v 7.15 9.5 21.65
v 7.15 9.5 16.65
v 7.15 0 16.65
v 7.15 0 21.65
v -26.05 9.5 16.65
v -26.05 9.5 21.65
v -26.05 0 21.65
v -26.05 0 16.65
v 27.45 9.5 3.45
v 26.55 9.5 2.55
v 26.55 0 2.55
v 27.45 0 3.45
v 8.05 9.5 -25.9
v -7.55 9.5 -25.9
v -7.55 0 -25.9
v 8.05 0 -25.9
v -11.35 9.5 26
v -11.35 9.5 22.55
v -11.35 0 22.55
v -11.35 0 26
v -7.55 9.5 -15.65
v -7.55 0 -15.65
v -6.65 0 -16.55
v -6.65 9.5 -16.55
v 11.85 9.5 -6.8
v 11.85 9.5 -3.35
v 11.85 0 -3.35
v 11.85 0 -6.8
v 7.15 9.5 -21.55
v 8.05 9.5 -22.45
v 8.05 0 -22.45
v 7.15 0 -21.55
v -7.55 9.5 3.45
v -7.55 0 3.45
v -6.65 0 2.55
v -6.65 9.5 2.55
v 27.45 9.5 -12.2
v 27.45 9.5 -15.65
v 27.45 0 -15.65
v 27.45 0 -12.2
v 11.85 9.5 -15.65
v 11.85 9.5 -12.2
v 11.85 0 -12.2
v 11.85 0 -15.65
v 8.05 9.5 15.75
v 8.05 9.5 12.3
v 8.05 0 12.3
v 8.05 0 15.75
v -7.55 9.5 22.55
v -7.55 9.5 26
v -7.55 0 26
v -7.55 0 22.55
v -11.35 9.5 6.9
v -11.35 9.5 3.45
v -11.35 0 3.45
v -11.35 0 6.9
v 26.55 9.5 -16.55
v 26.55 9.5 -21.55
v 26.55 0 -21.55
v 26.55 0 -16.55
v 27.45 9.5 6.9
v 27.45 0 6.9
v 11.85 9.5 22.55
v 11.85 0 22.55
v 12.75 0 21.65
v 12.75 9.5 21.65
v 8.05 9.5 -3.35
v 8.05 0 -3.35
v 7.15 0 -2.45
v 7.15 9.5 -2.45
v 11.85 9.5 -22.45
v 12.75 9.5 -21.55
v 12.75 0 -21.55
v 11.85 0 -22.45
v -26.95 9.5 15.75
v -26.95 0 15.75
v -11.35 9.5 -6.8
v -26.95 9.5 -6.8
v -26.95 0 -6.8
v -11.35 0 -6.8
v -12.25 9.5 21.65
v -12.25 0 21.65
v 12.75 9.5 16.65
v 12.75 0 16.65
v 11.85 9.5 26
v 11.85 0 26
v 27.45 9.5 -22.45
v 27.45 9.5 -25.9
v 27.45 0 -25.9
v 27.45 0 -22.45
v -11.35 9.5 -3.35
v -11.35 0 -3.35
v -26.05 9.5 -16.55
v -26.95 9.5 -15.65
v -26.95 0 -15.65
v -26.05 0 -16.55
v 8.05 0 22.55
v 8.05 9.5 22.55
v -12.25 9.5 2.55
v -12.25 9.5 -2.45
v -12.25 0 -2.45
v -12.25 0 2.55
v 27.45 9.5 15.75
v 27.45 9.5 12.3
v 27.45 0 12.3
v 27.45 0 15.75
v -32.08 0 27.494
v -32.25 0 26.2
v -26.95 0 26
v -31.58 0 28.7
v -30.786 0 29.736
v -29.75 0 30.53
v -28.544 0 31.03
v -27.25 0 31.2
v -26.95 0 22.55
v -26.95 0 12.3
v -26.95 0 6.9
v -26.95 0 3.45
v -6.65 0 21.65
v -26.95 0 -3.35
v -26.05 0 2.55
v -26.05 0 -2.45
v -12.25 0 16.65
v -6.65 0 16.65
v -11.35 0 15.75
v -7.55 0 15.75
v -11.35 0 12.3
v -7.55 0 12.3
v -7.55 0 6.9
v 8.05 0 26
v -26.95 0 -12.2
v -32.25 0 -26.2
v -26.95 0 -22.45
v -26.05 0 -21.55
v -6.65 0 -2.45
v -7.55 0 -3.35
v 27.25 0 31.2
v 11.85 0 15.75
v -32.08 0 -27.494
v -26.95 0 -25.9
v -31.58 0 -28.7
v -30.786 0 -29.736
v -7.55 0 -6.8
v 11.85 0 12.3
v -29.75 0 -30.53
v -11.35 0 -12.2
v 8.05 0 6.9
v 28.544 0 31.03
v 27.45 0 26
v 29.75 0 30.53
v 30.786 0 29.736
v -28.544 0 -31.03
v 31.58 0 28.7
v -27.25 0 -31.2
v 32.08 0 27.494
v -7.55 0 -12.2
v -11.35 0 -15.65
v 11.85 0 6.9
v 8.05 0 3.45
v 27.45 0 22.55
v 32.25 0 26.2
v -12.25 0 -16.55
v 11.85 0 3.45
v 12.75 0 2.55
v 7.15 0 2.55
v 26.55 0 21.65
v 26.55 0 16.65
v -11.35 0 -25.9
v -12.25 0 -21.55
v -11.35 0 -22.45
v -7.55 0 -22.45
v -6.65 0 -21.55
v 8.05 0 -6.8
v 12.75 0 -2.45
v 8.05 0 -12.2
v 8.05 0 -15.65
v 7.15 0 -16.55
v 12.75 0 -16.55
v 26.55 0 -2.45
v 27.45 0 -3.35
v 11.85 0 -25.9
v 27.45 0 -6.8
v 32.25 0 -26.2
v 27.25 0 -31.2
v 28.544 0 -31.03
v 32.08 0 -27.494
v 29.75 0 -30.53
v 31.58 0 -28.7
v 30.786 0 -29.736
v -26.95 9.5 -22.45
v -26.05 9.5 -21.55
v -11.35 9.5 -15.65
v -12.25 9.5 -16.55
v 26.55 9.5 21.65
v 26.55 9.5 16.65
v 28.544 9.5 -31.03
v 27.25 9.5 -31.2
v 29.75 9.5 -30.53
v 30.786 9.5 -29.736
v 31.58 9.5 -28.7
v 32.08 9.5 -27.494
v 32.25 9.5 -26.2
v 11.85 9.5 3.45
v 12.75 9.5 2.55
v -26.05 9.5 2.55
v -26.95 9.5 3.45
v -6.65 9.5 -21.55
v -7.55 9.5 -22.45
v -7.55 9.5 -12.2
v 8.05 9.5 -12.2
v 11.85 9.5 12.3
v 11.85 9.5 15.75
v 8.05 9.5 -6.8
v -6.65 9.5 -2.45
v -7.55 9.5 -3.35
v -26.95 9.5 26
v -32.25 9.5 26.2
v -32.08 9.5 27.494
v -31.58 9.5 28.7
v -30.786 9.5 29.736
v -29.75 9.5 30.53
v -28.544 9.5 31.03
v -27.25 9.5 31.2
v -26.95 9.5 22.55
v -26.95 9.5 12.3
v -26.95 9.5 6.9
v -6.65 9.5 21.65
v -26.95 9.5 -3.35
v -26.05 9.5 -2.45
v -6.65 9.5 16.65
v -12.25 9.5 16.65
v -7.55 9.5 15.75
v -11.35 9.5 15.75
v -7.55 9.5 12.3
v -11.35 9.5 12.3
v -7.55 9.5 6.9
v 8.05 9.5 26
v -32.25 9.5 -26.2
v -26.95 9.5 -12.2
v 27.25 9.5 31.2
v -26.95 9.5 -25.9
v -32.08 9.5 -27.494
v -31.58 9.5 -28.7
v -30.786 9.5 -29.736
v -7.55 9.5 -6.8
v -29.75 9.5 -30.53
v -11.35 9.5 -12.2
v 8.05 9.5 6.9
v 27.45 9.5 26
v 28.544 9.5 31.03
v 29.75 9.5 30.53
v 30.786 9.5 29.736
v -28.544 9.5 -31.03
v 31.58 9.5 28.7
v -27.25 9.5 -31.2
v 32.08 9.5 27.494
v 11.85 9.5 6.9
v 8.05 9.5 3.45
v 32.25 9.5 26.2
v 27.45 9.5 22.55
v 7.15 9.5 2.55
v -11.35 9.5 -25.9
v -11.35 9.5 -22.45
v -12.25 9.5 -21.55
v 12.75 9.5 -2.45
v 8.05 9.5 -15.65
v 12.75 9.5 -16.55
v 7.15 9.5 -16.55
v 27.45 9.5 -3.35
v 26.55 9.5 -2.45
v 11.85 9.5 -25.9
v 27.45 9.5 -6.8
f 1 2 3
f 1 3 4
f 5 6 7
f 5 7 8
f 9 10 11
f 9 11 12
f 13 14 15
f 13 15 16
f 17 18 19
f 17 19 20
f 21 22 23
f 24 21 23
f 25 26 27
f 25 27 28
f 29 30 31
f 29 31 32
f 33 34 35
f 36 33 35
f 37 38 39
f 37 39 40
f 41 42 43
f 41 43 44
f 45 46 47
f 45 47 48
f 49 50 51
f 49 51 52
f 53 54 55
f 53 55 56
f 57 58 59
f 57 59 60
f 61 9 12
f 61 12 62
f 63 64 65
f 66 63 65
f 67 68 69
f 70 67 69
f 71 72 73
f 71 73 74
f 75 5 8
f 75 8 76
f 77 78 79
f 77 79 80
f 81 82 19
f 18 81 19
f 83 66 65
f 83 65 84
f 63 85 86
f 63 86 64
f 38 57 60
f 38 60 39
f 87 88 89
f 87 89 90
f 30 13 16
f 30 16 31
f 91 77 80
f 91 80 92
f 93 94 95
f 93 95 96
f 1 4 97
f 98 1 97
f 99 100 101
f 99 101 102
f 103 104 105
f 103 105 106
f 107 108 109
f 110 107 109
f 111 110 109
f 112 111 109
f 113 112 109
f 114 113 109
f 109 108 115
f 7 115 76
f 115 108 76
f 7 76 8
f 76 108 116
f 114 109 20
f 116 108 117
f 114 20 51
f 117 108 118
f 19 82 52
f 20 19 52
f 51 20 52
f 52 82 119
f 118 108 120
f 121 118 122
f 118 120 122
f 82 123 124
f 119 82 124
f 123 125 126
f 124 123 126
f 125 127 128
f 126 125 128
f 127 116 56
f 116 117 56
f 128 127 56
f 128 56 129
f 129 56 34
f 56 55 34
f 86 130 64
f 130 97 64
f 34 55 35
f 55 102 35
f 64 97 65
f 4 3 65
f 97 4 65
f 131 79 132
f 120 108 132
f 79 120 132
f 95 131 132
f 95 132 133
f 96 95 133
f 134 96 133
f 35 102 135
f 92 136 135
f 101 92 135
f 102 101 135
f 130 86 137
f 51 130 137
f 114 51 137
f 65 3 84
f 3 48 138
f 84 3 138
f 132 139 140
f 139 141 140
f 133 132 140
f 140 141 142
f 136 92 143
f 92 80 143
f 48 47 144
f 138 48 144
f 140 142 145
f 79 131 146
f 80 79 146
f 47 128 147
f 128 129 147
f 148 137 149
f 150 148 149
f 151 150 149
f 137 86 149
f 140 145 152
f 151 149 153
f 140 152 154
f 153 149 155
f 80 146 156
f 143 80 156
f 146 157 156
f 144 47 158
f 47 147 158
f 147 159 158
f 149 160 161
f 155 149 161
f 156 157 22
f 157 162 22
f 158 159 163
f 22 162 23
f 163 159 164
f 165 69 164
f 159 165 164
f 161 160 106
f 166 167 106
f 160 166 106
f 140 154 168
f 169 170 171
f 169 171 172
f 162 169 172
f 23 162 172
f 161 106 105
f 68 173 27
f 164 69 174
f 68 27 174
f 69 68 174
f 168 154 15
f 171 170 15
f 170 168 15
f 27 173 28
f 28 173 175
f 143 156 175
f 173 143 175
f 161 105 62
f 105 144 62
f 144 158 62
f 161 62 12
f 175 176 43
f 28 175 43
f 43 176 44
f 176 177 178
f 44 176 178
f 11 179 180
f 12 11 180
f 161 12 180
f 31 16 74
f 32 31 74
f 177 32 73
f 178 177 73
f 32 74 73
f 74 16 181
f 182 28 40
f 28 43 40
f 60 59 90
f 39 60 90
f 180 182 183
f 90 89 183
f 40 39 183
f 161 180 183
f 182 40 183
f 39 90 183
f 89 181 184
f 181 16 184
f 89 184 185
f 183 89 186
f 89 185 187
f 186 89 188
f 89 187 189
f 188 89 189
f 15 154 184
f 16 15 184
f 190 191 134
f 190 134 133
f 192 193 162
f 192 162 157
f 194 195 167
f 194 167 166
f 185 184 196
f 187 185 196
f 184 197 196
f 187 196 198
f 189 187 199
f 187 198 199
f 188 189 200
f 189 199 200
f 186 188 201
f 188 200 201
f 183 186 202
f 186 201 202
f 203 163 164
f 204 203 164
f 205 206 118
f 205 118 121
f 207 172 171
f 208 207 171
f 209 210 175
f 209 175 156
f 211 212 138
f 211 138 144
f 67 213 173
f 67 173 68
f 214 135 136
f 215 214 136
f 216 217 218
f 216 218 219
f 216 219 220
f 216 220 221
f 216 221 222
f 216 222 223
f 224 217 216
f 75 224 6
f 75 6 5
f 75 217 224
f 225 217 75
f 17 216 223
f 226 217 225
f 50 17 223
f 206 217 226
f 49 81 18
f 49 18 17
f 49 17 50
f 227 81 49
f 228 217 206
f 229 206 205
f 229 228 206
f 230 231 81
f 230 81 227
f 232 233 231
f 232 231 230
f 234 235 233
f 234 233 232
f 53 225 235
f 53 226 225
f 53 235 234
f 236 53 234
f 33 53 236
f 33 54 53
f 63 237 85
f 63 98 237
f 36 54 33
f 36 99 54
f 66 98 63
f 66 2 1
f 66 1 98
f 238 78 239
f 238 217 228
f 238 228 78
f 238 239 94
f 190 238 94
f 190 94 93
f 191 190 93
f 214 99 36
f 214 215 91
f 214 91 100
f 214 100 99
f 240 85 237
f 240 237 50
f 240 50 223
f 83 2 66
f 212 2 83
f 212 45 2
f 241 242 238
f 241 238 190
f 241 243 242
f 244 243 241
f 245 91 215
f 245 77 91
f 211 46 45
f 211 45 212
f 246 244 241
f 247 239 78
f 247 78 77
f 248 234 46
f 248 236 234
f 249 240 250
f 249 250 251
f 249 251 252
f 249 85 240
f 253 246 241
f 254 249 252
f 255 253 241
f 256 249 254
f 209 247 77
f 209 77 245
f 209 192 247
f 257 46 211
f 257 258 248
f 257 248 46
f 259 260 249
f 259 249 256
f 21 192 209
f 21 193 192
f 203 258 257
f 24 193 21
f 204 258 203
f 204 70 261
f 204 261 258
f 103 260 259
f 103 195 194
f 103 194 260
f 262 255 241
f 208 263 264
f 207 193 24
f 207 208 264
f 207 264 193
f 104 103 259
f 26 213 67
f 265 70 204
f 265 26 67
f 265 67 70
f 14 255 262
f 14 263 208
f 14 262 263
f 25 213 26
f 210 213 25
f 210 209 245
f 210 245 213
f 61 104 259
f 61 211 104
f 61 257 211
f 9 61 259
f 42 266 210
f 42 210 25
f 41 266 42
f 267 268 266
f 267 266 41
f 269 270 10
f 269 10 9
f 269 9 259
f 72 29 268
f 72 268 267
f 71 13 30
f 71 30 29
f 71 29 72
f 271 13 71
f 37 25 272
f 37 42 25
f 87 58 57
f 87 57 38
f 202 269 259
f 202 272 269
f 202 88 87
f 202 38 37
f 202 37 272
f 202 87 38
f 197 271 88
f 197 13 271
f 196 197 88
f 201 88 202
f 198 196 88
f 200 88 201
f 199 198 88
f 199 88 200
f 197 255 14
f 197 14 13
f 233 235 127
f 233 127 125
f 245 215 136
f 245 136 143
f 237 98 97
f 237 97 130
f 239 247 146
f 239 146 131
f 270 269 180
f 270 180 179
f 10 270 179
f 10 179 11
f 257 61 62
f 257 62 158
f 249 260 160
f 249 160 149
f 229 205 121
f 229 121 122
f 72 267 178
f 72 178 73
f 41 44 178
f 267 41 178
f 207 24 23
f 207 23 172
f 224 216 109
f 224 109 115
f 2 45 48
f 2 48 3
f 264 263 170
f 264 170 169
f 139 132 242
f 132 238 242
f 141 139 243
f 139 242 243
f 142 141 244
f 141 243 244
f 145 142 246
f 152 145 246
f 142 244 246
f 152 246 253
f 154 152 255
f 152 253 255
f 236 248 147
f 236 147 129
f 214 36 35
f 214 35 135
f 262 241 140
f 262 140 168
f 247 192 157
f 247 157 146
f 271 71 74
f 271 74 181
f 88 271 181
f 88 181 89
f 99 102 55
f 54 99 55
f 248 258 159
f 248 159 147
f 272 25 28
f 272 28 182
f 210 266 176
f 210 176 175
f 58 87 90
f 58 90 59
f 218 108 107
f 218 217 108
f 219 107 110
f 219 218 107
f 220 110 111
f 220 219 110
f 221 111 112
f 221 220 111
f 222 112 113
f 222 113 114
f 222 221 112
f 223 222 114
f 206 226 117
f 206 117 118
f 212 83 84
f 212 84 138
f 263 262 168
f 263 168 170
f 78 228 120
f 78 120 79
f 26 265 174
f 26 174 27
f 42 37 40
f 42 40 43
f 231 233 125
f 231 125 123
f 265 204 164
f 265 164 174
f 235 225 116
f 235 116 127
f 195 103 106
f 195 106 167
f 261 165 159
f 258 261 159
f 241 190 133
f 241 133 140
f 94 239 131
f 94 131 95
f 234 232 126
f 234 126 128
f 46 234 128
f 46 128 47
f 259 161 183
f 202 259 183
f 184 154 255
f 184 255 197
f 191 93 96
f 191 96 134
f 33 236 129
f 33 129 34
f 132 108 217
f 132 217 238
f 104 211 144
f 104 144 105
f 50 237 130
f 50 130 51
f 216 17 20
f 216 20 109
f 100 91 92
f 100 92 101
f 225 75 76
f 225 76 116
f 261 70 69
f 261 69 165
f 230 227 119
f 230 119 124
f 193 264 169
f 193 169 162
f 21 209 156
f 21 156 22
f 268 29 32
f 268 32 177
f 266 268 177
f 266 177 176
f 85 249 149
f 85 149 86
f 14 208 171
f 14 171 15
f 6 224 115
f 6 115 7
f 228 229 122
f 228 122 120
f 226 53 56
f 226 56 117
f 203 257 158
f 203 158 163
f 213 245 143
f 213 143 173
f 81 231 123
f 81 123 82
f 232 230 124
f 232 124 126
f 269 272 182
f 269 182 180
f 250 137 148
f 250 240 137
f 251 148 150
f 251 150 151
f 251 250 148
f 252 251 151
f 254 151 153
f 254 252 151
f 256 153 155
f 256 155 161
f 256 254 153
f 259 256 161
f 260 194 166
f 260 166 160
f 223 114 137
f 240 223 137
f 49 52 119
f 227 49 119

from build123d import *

# Parameters (mm, degrees)
ESQUISSE1_W             = 64.5
ESQUISSE1_H             = 62.4
BOSS_EXTRU_1_DEPTH      = 9.5
ENL_V_MAT_EXTRU_1_DEPTH = 46.866681807
CONG_1_R                = 5


with BuildPart() as part:
    # Esquisse1 → Boss.-Extru.1 (new body)
    with BuildSketch(Plane(origin=(0, 0, 0), x_dir=(1, 0, 0), z_dir=(0, 1, 0))):
        Rectangle(ESQUISSE1_W, ESQUISSE1_H)
    extrude(amount=BOSS_EXTRU_1_DEPTH)

    # Esquisse2 → Enlèv. mat.-Extru.1 (cut, through all)
    with BuildSketch(Plane(origin=(0, 9.5, 0), x_dir=(1, 0, 0), z_dir=(0, 1, 0))):
        Polygon((-26.95, 25.9), (-11.35, 25.9), (-11.35, 22.45), (-12.25, 21.55), (-12.25, 16.55), (-11.35, 15.65), (-11.35, 12.2), (-26.95, 12.2), (-26.95, 15.65), (-26.05, 16.55), (-26.05, 21.55), (-26.95, 22.45), align=None)
        Polygon((-7.55, 25.9), (8.05, 25.9), (8.05, 22.45), (7.15, 21.55), (7.15, 16.55), (8.05, 15.65), (8.05, 12.2), (-7.55, 12.2), (-7.55, 15.65), (-6.65, 16.55), (-6.65, 21.55), (-7.55, 22.45), align=None)
        Polygon((11.85, 25.9), (27.45, 25.9), (27.45, 22.45), (26.55, 21.55), (26.55, 16.55), (27.45, 15.65), (27.45, 12.2), (11.85, 12.2), (11.85, 15.65), (12.75, 16.55), (12.75, 21.55), (11.85, 22.45), align=None)
        Polygon((-7.55, 6.8), (8.05, 6.8), (8.05, 3.35), (7.15, 2.45), (7.15, -2.55), (8.05, -3.45), (8.05, -6.9), (-7.55, -6.9), (-7.55, -3.45), (-6.65, -2.55), (-6.65, 2.45), (-7.55, 3.35), align=None)
        Polygon((11.85, 6.8), (27.45, 6.8), (27.45, 3.35), (26.55, 2.45), (26.55, -2.55), (27.45, -3.45), (27.45, -6.9), (11.85, -6.9), (11.85, -3.45), (12.75, -2.55), (12.75, 2.45), (11.85, 3.35), align=None)
        Polygon((-7.55, -12.3), (8.05, -12.3), (8.05, -15.75), (7.15, -16.65), (7.15, -21.65), (8.05, -22.55), (8.05, -26), (-7.55, -26), (-7.55, -22.55), (-6.65, -21.65), (-6.65, -16.65), (-7.55, -15.75), align=None)
        Polygon((11.85, -12.3), (27.45, -12.3), (27.45, -15.75), (26.55, -16.65), (26.55, -21.65), (27.45, -22.55), (27.45, -26), (11.85, -26), (11.85, -22.55), (12.75, -21.65), (12.75, -16.65), (11.85, -15.75), align=None)
        Polygon((-26.95, 6.8), (-11.35, 6.8), (-11.35, 3.35), (-12.25, 2.45), (-12.25, -2.55), (-11.35, -3.45), (-11.35, -6.9), (-26.95, -6.9), (-26.95, -3.45), (-26.05, -2.55), (-26.05, 2.45), (-26.95, 3.35), align=None)
        Polygon((-26.95, -12.3), (-11.35, -12.3), (-11.35, -15.75), (-12.25, -16.65), (-12.25, -21.65), (-11.35, -22.55), (-11.35, -26), (-26.95, -26), (-26.95, -22.55), (-26.05, -21.65), (-26.05, -16.65), (-26.95, -15.75), align=None)
    extrude(amount=-ENL_V_MAT_EXTRU_1_DEPTH, mode=Mode.SUBTRACT)

    # Congé1
    cong_1_edges = [part.edges().sort_by_distance(p)[0] for p in [
        (32.25, 4.75, 31.2),
        (-32.25, 4.75, 31.2),
        (-32.25, 4.75, -31.2),
        (32.25, 4.75, -31.2),
    ]]
    fillet(cong_1_edges, radius=CONG_1_R)


solid = part.part
